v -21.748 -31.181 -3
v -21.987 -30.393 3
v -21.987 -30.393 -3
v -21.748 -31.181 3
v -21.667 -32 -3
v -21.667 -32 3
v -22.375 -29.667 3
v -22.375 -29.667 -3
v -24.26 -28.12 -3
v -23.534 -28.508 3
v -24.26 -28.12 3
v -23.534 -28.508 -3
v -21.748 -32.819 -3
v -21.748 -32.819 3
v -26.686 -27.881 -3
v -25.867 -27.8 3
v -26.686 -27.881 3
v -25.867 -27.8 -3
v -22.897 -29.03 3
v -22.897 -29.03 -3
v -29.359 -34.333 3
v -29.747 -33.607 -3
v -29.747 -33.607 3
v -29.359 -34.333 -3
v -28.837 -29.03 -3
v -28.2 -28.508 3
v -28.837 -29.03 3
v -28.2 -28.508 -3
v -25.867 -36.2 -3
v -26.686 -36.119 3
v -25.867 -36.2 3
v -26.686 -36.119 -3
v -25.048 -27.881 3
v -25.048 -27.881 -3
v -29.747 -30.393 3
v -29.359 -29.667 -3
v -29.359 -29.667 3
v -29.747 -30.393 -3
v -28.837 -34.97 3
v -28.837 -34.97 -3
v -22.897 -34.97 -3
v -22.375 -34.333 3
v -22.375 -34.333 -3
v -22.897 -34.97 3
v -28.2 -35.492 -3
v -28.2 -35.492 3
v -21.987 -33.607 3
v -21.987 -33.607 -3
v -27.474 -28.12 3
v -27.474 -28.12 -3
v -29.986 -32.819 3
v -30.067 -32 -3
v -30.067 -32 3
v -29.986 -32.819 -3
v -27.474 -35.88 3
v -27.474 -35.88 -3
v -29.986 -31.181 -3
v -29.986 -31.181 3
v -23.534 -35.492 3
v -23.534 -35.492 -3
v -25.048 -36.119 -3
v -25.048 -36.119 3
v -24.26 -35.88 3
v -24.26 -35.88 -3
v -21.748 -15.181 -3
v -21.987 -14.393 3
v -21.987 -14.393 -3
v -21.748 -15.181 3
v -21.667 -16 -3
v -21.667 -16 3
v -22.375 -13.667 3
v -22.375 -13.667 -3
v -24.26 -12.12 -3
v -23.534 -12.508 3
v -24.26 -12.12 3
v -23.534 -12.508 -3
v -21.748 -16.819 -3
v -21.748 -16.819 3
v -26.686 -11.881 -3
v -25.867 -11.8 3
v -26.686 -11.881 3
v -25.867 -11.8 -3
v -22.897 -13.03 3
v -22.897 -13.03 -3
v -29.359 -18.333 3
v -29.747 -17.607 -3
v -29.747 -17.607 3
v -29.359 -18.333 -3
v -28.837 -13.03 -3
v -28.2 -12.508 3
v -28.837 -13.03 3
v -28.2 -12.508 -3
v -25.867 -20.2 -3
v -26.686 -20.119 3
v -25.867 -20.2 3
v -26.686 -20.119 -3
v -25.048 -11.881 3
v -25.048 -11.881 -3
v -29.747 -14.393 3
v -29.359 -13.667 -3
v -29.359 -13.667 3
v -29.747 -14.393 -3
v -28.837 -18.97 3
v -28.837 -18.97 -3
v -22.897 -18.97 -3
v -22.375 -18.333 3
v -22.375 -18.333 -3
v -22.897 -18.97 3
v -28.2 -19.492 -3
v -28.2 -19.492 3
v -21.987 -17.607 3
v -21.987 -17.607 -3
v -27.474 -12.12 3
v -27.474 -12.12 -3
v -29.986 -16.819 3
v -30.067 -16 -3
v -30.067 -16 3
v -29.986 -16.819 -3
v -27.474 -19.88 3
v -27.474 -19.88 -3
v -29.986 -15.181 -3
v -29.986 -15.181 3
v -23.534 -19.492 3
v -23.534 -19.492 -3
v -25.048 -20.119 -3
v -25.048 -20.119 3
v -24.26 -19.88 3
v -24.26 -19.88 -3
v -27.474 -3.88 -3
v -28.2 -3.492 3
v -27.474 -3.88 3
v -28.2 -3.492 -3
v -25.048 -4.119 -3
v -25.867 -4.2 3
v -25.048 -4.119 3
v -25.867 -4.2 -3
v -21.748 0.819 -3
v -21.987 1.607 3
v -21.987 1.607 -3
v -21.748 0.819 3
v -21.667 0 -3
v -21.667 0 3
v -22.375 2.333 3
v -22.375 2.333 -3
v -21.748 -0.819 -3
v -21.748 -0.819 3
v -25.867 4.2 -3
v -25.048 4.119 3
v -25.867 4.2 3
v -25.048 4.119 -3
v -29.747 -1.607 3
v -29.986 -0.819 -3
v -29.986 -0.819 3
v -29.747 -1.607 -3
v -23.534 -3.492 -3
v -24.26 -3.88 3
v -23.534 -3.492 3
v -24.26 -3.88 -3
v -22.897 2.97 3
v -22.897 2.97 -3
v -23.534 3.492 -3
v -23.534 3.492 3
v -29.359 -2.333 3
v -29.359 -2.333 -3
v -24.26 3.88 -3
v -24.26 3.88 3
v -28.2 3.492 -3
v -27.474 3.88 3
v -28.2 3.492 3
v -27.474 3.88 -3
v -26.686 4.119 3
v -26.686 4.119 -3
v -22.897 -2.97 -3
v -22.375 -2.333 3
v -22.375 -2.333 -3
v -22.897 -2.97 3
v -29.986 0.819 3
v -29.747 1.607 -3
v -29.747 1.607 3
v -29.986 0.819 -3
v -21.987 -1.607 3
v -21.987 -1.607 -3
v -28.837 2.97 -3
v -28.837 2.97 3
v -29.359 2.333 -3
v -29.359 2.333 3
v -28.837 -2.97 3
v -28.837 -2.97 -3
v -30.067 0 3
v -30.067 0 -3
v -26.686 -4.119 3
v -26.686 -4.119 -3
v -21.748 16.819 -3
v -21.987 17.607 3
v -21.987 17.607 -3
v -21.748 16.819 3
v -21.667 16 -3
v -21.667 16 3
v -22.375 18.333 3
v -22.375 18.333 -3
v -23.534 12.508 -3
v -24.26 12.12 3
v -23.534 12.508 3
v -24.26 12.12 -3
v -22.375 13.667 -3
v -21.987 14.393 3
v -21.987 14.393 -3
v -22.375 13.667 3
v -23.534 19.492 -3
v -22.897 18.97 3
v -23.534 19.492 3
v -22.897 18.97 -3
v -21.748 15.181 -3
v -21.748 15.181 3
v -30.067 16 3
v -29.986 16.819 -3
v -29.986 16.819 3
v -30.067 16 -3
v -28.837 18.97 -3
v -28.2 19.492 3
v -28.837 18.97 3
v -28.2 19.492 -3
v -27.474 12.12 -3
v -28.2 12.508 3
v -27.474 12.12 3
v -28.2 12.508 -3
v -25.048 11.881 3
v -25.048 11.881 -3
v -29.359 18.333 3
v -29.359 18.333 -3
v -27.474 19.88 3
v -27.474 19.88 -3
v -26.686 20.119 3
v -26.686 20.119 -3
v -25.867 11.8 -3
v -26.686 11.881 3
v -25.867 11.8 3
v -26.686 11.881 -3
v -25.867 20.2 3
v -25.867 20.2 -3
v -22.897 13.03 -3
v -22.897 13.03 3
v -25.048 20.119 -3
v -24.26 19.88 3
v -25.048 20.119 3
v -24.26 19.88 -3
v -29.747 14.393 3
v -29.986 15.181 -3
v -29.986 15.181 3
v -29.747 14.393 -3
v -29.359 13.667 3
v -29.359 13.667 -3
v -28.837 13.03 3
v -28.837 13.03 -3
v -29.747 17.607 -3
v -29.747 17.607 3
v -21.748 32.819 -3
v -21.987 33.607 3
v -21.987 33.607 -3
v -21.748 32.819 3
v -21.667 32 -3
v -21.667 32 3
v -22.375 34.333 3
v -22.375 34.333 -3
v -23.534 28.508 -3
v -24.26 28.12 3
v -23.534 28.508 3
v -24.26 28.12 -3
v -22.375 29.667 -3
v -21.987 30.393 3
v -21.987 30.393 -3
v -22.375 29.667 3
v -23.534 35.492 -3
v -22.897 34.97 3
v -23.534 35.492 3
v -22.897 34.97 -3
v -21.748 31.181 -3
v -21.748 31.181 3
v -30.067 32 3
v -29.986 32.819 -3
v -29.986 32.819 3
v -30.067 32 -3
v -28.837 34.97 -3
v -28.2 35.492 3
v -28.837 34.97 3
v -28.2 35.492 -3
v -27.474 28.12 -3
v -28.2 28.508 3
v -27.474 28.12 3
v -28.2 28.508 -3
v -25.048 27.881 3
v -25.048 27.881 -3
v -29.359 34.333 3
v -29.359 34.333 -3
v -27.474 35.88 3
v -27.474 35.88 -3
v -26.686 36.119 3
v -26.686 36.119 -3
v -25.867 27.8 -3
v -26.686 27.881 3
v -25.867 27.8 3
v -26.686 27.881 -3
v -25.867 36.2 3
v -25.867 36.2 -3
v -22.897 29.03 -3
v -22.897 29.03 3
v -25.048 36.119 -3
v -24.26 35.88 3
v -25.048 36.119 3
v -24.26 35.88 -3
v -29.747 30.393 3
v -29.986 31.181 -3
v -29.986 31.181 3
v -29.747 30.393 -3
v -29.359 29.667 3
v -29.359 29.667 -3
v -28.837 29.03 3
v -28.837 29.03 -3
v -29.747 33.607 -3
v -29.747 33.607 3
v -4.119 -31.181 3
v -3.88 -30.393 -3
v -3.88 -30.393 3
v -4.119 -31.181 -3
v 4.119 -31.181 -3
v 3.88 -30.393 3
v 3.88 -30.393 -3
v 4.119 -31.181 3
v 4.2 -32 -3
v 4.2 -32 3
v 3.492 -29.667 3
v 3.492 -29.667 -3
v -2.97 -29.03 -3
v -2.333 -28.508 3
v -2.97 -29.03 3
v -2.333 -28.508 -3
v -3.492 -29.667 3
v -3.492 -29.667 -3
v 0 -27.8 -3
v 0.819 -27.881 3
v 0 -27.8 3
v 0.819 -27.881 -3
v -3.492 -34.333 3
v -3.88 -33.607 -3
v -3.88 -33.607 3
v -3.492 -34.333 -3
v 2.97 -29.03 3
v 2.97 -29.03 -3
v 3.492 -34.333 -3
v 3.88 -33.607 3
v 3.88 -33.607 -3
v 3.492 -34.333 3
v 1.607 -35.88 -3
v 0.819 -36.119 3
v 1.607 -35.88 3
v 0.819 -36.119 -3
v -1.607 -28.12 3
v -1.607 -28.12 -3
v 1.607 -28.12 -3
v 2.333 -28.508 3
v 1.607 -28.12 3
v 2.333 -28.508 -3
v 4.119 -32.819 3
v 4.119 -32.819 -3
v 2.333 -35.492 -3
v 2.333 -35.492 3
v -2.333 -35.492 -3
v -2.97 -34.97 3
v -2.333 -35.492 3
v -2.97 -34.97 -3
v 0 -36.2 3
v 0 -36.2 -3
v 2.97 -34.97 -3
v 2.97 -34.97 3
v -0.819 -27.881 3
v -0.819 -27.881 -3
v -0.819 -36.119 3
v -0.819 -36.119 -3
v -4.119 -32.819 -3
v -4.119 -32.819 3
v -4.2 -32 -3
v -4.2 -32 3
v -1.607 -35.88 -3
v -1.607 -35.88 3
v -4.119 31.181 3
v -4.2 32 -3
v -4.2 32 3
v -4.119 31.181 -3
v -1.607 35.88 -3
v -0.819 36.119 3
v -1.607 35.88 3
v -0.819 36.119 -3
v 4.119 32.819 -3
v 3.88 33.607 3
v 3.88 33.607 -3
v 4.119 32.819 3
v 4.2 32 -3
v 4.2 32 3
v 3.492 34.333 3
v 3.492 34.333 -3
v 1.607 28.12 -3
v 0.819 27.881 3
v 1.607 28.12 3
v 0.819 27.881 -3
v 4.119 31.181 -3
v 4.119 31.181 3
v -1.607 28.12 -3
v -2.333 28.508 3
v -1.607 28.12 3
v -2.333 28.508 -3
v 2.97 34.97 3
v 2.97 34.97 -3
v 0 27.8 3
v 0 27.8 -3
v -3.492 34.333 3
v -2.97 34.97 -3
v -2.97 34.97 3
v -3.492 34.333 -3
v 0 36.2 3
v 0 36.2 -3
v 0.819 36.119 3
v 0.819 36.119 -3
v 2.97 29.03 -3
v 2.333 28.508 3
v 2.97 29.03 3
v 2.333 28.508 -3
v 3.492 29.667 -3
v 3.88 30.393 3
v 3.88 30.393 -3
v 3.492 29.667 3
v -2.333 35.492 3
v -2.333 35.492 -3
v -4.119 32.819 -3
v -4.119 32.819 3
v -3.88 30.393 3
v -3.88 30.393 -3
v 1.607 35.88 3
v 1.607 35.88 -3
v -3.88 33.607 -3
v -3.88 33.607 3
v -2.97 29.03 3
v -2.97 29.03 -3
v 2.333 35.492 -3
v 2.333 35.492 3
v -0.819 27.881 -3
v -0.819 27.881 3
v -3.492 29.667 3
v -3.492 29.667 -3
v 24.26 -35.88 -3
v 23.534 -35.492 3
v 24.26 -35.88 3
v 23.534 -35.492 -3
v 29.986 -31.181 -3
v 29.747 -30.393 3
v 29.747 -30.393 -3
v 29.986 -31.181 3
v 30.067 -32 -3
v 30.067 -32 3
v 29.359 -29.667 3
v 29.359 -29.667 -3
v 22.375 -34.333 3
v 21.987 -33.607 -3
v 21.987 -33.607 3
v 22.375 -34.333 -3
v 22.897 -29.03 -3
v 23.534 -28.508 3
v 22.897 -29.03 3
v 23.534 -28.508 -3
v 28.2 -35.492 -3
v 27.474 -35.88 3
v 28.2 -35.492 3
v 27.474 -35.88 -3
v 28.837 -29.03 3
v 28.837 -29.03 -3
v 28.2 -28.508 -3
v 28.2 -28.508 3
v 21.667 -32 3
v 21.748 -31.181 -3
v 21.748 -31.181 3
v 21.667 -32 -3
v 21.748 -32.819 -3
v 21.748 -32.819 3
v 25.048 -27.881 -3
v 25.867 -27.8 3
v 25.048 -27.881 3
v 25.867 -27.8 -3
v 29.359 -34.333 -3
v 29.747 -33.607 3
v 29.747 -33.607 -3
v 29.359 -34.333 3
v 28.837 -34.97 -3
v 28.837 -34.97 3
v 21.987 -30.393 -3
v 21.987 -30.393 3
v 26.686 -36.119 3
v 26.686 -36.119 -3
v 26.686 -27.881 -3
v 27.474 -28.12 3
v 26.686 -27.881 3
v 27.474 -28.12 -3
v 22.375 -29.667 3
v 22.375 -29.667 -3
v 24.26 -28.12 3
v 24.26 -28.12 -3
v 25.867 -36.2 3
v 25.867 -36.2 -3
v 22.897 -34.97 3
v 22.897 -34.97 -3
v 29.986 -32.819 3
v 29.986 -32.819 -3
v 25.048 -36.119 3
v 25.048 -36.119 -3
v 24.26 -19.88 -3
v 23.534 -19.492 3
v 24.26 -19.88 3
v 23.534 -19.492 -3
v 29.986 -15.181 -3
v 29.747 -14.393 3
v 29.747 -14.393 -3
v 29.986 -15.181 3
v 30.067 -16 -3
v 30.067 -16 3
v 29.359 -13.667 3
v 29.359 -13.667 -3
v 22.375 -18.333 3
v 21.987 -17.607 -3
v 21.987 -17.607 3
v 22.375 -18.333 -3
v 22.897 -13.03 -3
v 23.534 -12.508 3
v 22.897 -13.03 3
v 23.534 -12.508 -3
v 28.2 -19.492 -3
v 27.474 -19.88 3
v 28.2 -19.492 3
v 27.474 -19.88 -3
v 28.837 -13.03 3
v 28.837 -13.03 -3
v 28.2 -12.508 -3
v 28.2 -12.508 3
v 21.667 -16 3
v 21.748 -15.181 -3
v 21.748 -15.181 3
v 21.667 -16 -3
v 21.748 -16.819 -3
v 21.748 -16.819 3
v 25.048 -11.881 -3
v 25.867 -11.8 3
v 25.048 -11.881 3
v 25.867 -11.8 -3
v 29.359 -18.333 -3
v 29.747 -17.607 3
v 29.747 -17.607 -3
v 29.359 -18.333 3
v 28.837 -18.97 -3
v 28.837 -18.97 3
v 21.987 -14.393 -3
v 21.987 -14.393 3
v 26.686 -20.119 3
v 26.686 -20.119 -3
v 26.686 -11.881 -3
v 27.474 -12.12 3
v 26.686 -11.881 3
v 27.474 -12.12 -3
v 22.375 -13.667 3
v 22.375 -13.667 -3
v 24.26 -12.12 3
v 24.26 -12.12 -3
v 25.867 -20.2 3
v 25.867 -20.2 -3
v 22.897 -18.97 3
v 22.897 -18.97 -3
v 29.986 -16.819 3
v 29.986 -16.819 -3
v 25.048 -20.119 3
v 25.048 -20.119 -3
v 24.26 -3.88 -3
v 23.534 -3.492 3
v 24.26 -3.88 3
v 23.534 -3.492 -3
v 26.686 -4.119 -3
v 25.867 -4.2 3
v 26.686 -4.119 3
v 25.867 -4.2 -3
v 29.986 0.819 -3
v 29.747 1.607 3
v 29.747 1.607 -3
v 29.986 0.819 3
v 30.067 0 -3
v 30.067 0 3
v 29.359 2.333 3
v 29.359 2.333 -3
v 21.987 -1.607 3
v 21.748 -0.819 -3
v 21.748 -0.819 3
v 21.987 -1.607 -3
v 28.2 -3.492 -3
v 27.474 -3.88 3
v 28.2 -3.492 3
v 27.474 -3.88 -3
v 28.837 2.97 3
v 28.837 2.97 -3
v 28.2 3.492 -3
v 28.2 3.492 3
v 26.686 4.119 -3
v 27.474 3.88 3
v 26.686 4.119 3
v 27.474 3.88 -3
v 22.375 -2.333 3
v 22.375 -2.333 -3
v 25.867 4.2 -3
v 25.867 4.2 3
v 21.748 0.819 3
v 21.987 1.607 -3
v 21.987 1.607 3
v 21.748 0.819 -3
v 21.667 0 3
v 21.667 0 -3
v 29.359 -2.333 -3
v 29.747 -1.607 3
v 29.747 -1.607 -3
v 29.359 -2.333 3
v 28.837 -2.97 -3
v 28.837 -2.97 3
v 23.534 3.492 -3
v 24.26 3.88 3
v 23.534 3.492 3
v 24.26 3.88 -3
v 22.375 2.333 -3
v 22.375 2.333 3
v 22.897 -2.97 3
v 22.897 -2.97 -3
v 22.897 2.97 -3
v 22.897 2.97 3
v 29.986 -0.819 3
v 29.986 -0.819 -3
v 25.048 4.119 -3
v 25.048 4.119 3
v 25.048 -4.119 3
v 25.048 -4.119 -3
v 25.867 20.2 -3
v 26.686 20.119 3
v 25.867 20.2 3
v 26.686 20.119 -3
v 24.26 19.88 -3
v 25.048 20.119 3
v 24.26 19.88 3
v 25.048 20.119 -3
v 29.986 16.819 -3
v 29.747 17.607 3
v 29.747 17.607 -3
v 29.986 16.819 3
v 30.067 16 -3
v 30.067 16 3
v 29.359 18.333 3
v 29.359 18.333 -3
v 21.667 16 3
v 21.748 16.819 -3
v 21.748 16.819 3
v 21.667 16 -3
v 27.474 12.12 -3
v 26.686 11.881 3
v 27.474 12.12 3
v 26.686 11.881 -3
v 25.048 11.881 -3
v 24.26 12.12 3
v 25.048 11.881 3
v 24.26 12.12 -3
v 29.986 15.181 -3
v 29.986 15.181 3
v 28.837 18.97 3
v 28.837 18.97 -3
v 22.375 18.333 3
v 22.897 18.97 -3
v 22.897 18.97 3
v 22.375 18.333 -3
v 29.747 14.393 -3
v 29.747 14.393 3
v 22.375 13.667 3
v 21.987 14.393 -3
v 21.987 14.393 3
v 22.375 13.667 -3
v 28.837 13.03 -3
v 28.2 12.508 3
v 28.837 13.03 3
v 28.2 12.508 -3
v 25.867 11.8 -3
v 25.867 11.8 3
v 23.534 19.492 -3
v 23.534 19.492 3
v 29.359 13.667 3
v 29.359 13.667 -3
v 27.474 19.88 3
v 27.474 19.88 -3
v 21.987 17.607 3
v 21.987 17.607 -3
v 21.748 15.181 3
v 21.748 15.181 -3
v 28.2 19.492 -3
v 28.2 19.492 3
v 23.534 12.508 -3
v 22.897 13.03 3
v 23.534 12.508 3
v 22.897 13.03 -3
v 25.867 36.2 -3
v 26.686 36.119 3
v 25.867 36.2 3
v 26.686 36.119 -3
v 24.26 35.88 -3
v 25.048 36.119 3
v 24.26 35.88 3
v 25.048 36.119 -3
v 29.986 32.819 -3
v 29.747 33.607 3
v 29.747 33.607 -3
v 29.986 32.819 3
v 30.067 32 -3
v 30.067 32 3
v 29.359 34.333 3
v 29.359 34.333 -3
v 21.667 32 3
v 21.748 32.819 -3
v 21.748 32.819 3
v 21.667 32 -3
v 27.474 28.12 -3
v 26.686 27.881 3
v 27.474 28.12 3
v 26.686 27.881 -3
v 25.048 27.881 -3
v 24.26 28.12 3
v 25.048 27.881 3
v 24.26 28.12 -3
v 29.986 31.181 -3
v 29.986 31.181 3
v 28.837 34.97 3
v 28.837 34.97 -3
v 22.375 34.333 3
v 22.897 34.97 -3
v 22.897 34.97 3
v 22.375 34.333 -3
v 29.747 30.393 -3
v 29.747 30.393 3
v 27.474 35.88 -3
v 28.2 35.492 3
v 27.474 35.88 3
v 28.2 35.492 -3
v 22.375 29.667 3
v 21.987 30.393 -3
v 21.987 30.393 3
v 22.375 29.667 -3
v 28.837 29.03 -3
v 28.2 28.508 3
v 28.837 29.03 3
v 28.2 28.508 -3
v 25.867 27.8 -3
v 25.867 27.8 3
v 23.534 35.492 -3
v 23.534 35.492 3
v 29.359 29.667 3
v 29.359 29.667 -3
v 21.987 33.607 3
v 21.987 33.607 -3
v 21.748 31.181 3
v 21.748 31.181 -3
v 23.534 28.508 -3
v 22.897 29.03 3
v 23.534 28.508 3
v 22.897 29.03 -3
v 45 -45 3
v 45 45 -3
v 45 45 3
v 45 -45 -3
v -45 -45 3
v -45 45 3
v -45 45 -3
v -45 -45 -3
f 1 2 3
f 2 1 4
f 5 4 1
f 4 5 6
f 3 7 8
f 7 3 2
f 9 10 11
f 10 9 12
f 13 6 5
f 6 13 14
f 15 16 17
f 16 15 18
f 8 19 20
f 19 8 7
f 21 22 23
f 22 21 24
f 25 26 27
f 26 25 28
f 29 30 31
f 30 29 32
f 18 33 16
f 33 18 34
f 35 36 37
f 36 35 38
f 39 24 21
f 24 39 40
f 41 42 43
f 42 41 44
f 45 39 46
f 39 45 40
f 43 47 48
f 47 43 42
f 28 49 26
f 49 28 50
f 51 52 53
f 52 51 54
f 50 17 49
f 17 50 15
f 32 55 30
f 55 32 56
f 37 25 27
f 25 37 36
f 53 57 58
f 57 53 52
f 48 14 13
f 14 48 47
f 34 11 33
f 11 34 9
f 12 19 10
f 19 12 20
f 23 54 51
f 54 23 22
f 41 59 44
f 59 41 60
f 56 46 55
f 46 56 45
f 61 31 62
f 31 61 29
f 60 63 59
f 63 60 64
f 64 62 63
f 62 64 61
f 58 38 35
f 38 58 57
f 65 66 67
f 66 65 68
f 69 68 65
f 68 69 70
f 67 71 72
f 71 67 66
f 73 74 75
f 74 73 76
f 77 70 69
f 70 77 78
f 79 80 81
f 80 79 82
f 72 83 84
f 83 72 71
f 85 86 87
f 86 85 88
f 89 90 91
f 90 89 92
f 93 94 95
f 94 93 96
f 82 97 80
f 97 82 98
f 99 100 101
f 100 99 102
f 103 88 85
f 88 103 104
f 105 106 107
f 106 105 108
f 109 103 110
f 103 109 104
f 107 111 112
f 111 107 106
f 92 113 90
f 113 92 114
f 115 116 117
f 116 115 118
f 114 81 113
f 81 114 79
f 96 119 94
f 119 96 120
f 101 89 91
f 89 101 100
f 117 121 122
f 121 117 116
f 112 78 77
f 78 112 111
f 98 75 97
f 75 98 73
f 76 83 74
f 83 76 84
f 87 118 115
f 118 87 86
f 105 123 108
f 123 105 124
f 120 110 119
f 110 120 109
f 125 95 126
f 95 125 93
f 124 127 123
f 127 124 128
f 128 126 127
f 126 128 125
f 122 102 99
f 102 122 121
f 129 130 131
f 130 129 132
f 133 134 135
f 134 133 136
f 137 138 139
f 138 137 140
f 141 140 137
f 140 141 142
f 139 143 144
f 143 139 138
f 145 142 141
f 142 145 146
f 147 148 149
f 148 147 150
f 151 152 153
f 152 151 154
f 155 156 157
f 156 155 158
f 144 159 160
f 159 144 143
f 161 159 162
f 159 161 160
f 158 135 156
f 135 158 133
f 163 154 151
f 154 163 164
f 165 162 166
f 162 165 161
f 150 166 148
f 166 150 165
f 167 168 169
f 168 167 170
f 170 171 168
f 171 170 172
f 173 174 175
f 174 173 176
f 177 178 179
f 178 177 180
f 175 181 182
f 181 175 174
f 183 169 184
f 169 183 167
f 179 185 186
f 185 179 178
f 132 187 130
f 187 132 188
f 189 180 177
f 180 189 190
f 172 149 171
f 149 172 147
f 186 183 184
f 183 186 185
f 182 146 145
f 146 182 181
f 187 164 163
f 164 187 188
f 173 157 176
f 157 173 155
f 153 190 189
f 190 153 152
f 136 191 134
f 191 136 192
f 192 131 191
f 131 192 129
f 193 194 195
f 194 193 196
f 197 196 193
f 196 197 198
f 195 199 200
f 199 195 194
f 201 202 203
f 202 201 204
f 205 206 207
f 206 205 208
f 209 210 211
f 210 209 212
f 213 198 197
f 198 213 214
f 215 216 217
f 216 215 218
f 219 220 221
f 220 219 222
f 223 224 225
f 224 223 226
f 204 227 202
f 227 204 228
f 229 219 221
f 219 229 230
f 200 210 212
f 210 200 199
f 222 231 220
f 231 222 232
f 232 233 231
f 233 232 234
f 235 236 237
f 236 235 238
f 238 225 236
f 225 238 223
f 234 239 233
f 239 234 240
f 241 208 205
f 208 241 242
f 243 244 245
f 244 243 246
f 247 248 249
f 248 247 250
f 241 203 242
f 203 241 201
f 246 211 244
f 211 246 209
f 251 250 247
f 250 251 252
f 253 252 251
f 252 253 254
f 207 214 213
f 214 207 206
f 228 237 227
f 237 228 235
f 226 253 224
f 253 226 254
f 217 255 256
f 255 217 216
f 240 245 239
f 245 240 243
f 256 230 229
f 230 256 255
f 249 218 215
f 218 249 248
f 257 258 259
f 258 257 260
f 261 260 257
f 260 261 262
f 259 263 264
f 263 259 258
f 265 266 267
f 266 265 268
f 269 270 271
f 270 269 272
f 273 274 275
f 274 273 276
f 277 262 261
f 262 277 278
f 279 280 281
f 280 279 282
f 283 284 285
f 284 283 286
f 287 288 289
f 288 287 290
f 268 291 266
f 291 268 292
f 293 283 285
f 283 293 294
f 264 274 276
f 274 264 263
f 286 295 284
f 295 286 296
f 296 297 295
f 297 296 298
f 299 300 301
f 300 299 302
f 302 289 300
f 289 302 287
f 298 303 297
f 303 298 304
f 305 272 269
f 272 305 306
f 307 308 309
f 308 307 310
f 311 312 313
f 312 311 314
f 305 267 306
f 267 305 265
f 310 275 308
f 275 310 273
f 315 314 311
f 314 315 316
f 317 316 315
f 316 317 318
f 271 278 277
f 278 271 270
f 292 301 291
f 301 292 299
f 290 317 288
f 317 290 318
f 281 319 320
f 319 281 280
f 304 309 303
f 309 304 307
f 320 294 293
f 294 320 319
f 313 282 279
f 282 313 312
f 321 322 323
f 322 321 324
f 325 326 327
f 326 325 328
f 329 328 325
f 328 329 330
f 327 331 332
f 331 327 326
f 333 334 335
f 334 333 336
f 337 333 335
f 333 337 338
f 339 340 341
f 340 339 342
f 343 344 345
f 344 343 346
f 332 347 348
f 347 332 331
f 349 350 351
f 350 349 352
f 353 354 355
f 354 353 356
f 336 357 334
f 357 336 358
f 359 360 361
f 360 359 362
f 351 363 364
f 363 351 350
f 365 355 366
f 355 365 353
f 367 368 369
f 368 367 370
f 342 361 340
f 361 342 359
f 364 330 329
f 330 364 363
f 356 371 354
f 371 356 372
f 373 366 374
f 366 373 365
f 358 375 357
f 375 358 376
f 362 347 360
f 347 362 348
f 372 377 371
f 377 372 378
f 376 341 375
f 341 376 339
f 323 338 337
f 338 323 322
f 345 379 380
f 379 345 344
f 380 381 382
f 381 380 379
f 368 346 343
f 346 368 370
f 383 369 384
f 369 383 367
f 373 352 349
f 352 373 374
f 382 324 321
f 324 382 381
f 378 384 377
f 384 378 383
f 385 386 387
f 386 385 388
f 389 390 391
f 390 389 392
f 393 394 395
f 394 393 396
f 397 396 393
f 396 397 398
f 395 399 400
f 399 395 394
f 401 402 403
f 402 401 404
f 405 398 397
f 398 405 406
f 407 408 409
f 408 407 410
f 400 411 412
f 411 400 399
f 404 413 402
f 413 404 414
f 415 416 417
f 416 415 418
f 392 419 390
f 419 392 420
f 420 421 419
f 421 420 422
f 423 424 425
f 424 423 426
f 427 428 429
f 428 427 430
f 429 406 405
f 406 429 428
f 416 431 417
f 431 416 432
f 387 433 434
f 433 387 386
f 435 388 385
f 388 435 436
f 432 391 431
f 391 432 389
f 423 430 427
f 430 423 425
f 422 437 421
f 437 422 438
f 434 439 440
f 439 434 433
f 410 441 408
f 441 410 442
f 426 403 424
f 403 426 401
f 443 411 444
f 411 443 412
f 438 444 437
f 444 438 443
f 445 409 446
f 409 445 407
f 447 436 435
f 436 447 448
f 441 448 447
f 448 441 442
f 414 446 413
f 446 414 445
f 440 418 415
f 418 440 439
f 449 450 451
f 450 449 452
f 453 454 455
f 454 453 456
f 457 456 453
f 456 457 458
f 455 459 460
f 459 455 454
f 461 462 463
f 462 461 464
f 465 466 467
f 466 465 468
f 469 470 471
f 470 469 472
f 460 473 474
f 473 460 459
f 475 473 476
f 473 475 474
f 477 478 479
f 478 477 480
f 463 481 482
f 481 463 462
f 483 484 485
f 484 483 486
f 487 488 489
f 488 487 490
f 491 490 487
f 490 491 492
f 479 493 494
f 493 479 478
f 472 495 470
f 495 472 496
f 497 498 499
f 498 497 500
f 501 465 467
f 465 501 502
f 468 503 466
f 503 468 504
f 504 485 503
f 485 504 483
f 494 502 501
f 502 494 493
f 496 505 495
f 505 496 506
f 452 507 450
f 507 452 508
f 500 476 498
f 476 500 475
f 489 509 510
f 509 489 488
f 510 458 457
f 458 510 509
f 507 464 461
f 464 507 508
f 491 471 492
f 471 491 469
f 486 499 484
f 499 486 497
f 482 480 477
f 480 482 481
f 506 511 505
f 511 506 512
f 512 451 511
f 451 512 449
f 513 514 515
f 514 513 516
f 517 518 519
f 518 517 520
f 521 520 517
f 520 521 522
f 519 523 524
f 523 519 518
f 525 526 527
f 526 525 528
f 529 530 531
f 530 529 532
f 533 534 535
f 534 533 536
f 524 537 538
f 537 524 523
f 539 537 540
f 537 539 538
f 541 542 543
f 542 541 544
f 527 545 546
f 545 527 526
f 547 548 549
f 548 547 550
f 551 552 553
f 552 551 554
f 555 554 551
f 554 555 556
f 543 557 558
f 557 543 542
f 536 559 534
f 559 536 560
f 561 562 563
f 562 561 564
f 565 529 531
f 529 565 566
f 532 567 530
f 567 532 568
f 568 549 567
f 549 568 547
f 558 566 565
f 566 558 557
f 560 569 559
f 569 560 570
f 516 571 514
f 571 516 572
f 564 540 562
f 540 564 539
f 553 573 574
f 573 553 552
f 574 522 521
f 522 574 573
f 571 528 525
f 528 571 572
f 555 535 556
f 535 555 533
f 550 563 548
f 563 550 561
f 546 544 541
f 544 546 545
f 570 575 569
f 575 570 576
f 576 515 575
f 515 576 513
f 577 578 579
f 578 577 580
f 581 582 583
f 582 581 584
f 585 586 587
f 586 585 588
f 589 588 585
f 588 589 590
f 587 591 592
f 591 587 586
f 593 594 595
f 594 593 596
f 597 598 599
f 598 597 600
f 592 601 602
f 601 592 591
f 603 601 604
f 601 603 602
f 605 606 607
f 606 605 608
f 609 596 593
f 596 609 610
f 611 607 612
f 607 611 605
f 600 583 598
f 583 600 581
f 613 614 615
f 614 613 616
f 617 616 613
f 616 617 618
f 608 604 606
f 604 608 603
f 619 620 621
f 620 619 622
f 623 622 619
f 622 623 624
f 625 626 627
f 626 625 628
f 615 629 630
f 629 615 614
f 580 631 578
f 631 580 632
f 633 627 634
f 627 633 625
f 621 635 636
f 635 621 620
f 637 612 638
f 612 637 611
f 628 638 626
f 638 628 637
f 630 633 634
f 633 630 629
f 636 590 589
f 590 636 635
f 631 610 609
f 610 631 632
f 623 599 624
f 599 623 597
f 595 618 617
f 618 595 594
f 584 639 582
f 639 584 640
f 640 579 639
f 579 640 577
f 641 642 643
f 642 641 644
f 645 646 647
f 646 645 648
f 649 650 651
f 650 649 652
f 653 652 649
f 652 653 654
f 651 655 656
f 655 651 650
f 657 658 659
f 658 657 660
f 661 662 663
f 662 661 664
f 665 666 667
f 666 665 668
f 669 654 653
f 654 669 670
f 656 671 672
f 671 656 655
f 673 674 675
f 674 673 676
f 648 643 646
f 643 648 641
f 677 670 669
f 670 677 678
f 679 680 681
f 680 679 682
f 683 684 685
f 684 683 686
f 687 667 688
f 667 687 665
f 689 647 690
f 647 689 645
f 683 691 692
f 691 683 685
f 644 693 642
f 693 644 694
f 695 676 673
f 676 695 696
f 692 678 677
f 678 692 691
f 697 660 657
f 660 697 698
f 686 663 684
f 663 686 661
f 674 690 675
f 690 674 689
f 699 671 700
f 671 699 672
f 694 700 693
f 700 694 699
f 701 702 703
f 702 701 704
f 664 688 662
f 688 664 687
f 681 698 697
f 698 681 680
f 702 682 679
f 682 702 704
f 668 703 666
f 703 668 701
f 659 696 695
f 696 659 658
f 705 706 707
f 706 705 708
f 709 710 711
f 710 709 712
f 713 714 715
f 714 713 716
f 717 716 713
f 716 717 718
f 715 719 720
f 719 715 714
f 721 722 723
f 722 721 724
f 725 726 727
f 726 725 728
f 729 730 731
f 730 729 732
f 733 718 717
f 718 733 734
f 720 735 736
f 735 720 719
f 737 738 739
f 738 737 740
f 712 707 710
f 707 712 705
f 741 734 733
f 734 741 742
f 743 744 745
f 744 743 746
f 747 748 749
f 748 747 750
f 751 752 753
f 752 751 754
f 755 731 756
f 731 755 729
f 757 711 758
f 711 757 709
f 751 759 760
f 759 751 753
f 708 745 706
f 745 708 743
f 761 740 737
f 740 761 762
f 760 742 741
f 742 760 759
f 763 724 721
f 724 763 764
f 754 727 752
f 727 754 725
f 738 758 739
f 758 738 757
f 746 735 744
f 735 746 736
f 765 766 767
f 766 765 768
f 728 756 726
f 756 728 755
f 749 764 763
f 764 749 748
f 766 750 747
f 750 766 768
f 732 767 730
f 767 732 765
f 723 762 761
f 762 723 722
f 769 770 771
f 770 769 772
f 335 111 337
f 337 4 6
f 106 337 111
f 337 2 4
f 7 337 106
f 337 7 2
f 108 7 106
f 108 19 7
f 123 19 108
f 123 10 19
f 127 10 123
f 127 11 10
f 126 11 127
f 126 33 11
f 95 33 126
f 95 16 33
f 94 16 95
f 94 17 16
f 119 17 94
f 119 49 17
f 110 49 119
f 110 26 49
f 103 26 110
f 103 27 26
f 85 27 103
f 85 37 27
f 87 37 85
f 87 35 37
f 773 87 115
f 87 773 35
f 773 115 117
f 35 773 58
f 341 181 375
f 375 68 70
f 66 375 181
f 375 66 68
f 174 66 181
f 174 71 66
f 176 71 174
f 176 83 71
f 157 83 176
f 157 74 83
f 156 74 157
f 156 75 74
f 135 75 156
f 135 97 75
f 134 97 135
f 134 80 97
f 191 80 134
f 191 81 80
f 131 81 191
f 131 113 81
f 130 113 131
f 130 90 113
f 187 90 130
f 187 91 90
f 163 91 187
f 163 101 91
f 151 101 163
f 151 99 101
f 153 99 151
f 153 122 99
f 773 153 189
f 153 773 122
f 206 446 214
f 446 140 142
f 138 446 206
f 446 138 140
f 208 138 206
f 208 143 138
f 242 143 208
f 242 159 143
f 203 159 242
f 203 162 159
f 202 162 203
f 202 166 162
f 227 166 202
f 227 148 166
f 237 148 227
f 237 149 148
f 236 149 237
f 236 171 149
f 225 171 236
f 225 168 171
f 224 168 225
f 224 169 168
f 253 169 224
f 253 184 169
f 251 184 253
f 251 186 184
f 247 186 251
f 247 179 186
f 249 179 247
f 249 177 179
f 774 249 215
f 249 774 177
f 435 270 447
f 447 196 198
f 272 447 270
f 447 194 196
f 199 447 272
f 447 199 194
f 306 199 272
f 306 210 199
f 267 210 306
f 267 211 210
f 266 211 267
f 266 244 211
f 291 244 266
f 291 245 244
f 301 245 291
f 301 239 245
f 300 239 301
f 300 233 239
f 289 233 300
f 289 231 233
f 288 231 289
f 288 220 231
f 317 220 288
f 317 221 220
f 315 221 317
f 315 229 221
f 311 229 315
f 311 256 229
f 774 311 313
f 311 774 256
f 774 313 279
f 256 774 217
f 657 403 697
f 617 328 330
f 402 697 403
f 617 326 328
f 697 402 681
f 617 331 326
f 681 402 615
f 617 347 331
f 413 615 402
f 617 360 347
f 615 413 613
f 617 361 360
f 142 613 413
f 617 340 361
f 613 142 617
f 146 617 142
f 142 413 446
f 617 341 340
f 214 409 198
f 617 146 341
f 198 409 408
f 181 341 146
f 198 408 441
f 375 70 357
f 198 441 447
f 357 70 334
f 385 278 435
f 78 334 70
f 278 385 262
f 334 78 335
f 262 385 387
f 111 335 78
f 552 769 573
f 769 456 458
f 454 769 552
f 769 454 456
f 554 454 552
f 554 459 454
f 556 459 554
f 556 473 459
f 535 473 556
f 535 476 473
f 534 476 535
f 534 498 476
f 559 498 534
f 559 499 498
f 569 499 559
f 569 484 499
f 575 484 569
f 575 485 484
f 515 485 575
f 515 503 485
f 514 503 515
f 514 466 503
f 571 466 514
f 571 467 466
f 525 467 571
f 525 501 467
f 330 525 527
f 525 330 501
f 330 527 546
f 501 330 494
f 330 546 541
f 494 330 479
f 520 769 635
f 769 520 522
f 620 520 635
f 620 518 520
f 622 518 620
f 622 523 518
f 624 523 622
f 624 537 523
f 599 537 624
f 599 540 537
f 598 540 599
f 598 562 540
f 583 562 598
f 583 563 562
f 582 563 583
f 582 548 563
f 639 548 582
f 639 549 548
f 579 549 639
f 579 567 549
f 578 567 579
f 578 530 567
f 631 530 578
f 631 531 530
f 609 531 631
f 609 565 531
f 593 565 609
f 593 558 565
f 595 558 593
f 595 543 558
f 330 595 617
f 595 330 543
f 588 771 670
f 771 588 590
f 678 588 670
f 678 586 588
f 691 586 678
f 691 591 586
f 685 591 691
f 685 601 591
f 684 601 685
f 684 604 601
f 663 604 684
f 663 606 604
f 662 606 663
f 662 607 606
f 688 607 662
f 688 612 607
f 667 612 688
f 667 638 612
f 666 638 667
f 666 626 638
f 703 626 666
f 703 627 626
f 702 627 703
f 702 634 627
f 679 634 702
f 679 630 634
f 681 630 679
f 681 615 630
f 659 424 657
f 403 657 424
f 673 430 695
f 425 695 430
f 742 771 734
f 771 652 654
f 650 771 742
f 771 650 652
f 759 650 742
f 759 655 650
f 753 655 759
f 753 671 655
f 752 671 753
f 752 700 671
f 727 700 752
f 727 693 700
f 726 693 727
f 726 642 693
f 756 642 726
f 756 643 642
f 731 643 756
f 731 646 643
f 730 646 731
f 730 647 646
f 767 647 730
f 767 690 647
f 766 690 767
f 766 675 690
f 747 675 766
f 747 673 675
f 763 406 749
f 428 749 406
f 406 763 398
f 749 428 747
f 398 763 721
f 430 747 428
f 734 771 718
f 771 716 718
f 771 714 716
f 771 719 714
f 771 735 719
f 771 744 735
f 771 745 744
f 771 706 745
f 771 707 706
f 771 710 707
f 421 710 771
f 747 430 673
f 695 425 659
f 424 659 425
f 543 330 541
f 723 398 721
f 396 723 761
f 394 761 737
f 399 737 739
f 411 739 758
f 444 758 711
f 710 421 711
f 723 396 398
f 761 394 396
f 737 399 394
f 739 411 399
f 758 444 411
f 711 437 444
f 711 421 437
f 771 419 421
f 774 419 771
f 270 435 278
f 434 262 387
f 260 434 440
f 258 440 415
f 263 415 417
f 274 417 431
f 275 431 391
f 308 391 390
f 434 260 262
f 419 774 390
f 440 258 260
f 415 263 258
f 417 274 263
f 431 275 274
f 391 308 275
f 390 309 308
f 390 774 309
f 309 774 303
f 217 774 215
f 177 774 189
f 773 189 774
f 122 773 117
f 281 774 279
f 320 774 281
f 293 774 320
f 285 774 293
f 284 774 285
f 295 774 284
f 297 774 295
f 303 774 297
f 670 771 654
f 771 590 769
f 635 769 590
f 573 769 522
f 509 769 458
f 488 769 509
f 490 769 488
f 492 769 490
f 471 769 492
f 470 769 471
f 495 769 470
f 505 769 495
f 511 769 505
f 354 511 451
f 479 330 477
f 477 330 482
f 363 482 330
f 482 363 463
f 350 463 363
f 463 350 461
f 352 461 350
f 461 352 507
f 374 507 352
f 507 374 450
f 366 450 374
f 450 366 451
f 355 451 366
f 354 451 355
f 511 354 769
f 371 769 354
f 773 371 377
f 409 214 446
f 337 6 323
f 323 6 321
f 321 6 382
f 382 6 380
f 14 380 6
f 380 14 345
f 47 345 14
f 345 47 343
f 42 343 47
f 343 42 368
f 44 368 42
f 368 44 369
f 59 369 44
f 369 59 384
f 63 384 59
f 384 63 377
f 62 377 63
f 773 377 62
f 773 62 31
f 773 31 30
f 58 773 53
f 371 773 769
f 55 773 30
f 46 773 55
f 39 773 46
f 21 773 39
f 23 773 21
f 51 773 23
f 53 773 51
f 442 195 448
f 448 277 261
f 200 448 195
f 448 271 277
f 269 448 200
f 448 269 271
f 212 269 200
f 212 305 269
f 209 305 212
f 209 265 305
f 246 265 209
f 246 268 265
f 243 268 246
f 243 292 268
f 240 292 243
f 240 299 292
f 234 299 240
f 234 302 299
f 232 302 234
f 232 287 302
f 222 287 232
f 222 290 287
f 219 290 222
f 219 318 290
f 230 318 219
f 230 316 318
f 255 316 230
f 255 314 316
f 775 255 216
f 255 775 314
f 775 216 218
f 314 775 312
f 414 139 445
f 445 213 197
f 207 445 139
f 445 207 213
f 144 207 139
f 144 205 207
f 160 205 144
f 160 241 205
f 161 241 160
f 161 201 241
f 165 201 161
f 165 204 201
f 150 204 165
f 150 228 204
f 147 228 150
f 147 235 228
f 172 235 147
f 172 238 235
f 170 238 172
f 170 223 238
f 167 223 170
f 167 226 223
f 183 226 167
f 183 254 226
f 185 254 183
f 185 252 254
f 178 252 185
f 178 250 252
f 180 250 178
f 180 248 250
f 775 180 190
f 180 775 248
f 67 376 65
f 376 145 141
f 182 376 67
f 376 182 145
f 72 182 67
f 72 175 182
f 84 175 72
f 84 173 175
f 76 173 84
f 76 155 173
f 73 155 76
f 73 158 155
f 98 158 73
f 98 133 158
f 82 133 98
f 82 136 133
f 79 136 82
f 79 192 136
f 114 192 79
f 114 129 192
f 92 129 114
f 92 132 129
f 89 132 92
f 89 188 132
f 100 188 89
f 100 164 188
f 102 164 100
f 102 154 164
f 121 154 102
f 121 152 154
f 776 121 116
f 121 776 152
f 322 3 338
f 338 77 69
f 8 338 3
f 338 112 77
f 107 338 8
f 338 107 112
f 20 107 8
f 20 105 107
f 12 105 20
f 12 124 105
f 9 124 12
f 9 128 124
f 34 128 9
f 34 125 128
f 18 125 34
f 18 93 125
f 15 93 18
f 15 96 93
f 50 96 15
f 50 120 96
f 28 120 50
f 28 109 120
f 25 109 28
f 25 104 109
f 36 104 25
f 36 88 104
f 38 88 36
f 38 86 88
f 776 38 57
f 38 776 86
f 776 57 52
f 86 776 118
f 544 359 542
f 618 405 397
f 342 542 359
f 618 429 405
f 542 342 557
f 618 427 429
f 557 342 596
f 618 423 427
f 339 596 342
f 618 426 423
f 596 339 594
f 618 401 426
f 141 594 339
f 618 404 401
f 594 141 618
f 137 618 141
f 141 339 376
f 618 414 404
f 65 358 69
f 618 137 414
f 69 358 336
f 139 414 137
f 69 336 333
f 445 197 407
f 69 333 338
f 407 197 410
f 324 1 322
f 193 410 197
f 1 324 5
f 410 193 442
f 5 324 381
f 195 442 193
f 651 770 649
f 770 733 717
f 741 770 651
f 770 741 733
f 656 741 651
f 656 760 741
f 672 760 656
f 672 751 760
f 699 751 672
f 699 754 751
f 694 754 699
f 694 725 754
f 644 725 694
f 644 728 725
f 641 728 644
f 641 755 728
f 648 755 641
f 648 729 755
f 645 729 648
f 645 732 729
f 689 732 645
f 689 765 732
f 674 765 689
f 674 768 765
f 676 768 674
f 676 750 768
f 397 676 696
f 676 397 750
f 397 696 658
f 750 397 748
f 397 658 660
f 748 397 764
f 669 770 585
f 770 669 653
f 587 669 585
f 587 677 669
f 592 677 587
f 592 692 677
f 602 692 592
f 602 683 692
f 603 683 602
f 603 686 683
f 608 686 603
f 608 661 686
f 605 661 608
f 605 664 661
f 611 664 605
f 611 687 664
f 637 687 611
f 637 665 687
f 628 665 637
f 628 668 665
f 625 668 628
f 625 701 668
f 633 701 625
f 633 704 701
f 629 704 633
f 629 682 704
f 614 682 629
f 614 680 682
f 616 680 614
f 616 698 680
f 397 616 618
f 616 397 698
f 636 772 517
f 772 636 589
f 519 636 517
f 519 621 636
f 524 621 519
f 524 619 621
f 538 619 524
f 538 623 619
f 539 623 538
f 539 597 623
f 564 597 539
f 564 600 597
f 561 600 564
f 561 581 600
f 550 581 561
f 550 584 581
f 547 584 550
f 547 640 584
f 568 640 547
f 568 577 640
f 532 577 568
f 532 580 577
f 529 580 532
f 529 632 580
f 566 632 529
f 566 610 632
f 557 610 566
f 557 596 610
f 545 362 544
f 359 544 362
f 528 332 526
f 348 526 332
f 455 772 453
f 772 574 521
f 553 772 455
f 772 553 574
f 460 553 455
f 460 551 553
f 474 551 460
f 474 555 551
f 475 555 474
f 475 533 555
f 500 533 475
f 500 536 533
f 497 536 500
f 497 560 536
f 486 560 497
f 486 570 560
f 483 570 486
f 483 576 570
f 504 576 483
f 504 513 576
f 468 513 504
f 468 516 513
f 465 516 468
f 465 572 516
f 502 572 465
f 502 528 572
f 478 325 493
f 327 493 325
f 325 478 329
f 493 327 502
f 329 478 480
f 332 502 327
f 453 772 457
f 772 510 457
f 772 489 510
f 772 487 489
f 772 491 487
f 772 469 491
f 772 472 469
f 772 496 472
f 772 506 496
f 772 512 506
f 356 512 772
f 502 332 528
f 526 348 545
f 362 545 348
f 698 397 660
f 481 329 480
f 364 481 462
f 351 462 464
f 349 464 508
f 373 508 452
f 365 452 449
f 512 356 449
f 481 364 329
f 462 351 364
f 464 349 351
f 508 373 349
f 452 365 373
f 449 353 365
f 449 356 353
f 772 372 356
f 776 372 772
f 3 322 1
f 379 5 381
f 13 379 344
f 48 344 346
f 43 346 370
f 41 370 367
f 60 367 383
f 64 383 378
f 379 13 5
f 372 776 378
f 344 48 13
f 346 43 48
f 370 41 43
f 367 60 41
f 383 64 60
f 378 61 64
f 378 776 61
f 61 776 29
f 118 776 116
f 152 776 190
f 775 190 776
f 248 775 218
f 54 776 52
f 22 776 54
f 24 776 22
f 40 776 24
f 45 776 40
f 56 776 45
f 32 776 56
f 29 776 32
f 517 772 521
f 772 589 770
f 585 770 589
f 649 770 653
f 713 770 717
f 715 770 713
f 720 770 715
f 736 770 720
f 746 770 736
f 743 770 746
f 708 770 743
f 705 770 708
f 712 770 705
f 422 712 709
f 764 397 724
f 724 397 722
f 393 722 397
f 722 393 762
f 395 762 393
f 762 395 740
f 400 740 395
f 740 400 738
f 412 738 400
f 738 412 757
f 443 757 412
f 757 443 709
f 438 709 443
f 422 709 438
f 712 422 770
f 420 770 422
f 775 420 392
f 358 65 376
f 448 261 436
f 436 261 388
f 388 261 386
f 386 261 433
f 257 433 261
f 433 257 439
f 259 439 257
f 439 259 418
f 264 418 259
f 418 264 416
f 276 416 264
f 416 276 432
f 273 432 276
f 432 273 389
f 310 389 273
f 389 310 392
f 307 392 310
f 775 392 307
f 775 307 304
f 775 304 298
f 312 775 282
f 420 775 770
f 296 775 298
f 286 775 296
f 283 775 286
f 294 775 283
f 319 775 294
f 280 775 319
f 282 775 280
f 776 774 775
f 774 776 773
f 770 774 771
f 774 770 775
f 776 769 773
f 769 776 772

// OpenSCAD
$fn = 32;

// ----------------------------------------------------------------------
// Perforated panel 90 x 90 x 6
// 5 x 3 Ø8.4 holes, frame layout
// ----------------------------------------------------------------------

// --- parameters (mm) ---
panel = [90, 90, 6];  // overall size (x, y, z)
hole_d = 8.4;         // hole diameter
pitch_x = 25.867;     // hole pitch along X
pitch_y = 16;         // hole pitch along Y

// --- derived feature positions (mm) ---
margin = hole_d / 2 + 2;            // = 6.2   clearance from the panel edge
cols = floor((panel[0] - 2 * margin) / pitch_x) + 1;  // = 3   how many columns fit in X
rows = floor((panel[1] - 2 * margin) / pitch_y) + 1;  // = 5   how many rows fit in Y
span_x = (cols - 1) * pitch_x + 0;  // = 51.73   width of the field
span_y = (rows - 1) * pitch_y;      // = 64   height of the field
origin_x = -span_x / 2;             // = -25.87   X of the first hole
origin_y = -span_y / 2;             // = -32   Y of the first row
holes = 2 * cols + 2 * (rows - 2);  // = 12   holes around the frame
feature_centers = [
  [origin_x + 0 * pitch_x, origin_y + 0 * pitch_y],
  [origin_x + 0 * pitch_x, origin_y + 1 * pitch_y],
  [origin_x + 0 * pitch_x, origin_y + 2 * pitch_y],
  [origin_x + 0 * pitch_x, origin_y + 3 * pitch_y],
  [origin_x + 0 * pitch_x, origin_y + 4 * pitch_y],
  [origin_x + 1 * pitch_x, origin_y + 0 * pitch_y],
  [origin_x + 1 * pitch_x, origin_y + 4 * pitch_y],
  [origin_x + 2 * pitch_x, origin_y + 0 * pitch_y],
  [origin_x + 2 * pitch_x, origin_y + 1 * pitch_y],
  [origin_x + 2 * pitch_x, origin_y + 2 * pitch_y],
  [origin_x + 2 * pitch_x, origin_y + 3 * pitch_y],
  [origin_x + 2 * pitch_x, origin_y + 4 * pitch_y]
];   // hole centres, used verbatim by the cutter loop

// panel outline, every hole through
difference() {
  cube(panel, center = true);
  for (centre = feature_centers)
    translate([centre[0], centre[1], 0])
      cylinder(d = hole_d, h = panel[2] + 2, center = true);
}
